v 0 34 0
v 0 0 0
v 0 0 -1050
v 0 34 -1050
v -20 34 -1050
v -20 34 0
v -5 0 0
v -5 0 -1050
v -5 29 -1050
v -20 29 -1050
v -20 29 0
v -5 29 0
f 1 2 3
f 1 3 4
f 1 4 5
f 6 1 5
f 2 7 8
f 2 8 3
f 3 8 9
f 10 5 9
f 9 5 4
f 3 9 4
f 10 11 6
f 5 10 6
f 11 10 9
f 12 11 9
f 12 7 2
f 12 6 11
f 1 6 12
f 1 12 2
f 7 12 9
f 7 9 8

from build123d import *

# Parameters (mm, degrees)
CROQUIS1_W              = 15
CROQUIS1_H              = 5
SALIENTE_EXTRUIR1_DEPTH = 1050


with BuildPart() as part:
    # Croquis1 → Saliente-Extruir1 (new body)
    with BuildSketch(Plane.XY):
        Polygon((-5, 0), (0, 0), (0, 34), (-5, 34), (-5, 29), align=None)
        with Locations((-12.5, 31.5)):
            Rectangle(CROQUIS1_W, CROQUIS1_H)
    extrude(amount=-SALIENTE_EXTRUIR1_DEPTH)


solid = part.part
